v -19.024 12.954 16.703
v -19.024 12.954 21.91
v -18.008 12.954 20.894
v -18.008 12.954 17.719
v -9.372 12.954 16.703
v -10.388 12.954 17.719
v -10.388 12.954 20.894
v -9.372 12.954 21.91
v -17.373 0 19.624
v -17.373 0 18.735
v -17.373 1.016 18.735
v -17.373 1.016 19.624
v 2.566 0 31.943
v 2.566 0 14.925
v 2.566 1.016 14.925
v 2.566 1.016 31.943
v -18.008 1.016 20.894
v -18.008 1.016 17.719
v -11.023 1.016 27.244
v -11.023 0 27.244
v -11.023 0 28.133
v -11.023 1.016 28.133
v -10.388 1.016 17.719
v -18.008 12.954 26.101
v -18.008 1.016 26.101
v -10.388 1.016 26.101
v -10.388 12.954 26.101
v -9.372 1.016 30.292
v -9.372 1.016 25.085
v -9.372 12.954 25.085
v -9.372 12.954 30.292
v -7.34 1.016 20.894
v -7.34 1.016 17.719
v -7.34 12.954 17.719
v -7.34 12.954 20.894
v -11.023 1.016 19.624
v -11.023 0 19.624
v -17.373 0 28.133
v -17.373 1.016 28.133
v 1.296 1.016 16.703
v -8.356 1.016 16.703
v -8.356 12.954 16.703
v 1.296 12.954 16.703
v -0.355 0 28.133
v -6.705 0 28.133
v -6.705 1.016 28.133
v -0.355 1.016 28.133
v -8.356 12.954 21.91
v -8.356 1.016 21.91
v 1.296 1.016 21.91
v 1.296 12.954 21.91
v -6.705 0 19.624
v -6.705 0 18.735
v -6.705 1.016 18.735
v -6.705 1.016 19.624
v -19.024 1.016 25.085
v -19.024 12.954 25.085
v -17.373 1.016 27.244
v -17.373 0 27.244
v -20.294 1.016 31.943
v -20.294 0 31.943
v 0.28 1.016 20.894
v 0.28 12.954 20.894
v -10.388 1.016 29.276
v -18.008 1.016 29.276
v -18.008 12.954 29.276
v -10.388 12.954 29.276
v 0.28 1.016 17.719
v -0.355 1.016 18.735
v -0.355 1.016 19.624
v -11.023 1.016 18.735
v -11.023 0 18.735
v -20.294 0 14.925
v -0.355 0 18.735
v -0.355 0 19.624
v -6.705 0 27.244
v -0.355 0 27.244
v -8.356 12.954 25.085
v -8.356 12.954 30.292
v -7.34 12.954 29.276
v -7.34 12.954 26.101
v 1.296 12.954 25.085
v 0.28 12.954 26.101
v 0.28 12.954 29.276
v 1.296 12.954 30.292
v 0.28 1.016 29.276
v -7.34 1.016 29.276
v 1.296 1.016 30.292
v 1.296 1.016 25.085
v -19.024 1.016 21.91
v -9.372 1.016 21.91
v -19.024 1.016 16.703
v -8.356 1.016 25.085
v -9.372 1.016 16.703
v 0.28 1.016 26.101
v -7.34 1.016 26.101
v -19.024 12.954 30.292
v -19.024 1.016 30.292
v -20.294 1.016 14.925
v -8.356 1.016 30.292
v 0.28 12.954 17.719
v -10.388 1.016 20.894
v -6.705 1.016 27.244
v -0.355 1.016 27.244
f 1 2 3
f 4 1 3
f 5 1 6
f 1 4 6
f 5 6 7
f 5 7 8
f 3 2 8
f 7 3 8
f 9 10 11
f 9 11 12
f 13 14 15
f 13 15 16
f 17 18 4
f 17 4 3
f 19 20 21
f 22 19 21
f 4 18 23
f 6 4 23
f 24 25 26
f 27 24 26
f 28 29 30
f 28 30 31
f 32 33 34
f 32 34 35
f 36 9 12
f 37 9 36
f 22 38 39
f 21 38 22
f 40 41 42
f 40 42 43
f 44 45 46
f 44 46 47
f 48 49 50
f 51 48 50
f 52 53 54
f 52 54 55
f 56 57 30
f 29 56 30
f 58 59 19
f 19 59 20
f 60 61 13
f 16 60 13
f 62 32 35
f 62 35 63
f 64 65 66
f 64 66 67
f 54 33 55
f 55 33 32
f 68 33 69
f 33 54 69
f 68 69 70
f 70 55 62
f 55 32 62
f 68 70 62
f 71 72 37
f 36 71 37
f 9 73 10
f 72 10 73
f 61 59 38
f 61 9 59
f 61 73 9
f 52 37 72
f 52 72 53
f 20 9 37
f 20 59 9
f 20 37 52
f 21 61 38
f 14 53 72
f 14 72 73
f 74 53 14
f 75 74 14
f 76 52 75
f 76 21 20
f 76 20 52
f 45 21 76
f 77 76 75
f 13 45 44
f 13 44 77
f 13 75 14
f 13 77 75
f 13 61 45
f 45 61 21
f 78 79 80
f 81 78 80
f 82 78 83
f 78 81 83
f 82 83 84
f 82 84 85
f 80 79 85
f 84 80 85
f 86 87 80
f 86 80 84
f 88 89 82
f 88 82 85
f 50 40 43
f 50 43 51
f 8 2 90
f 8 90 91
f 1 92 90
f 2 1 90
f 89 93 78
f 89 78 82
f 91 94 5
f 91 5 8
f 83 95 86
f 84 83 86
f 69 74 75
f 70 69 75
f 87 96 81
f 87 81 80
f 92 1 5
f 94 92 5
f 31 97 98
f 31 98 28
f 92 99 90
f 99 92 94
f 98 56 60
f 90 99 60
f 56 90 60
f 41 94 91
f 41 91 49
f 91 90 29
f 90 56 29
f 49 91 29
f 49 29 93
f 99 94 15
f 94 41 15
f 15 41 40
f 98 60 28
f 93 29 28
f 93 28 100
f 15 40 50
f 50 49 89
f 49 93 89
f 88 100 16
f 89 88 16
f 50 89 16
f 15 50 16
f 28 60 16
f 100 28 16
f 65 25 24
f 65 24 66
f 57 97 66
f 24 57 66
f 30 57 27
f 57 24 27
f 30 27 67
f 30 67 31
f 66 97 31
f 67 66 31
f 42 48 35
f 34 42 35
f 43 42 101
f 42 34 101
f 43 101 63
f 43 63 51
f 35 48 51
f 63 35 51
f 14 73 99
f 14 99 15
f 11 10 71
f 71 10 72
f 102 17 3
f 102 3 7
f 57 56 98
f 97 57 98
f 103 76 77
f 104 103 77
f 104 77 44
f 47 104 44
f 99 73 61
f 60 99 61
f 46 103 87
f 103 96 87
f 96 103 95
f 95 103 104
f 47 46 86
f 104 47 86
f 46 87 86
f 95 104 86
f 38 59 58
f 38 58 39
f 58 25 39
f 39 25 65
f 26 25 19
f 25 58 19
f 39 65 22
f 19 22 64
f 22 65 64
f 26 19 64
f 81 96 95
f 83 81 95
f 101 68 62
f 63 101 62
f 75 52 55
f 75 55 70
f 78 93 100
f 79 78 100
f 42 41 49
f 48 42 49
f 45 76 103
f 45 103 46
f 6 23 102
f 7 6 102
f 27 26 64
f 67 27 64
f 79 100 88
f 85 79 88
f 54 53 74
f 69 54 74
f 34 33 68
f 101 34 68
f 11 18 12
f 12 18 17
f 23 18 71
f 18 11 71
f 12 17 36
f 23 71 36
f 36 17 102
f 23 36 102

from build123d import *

# Parameters (mm, degrees)
F0_W     = 25.4
F0_H     = 22.86
F1_DEPTH = 1.016
F2_W     = 6.35
F2_H     = 0.889
F3_DEPTH = 25.4
F4_W     = 9.652
F4_H     = 5.207
F4_W_2   = 7.62
F4_H_2   = 3.175
F5_DEPTH = 12.954
F6_W     = 25.4
F6_H     = 2.794
F6_H_2   = 3.048
F7_DEPTH = 12.955
F8_W     = 2.54
F8_H     = 17.018
F9_DEPTH = 25.4


with BuildPart() as f1:
    # F0 (on Front) → F1 (new body)
    with BuildSketch(Plane.XZ):
        with Locations((-10.134171, 23.561226)):
            Rectangle(F0_W, F0_H)
    extrude(amount=-F1_DEPTH)

    # F2 (on face) → F3 (cut)
    with BuildSketch(Plane.XZ):
        with Locations((-14.198171, 27.688726)):
            Rectangle(F2_W, F2_H)
        with Locations((-3.530171, 27.688726)):
            Rectangle(F2_W, F2_H)
        with Locations((-14.198171, 19.179726)):
            Rectangle(F2_W, F2_H)
        with Locations((-3.530171, 19.179726)):
            Rectangle(F2_W, F2_H)
    extrude(amount=-F3_DEPTH, mode=Mode.SUBTRACT)

    # F4 (on face) → F5 (join)
    with BuildSketch(Plane.XZ):
        with Locations((-14.198171, 27.688726)):
            Rectangle(F4_W, F4_H)
        with Locations((-14.198171, 27.688726)):
            Rectangle(F4_W_2, F4_H_2, mode=Mode.SUBTRACT)
        with Locations((-3.530171, 27.688726)):
            Rectangle(F4_W, F4_H)
        with Locations((-3.530171, 27.688726)):
            Rectangle(F4_W_2, F4_H_2, mode=Mode.SUBTRACT)
        with Locations((-14.198171, 19.306726)):
            Rectangle(F4_W, F4_H)
        with Locations((-14.198171, 19.306726)):
            Rectangle(F4_W_2, F4_H_2, mode=Mode.SUBTRACT)
        with Locations((-3.530171, 19.306726)):
            Rectangle(F4_W, F4_H)
        with Locations((-3.530171, 19.306726)):
            Rectangle(F4_W_2, F4_H_2, mode=Mode.SUBTRACT)
    extrude(amount=-F5_DEPTH)

    # F6 (on face) → F7 (cut, through all)
    with BuildSketch(Plane.XZ):
        with Locations((-10.134171, 13.528226)):
            Rectangle(F6_W, F6_H)
        with Locations((-10.134171, 33.467226)):
            Rectangle(F6_W, F6_H_2)
    extrude(amount=-F7_DEPTH, mode=Mode.SUBTRACT)

    # F8 (on face) → F9 (cut)
    with BuildSketch(Plane.XZ):
        with Locations((-21.564171, 23.434226)):
            Rectangle(F8_W, F8_H)
    extrude(amount=-F9_DEPTH, mode=Mode.SUBTRACT)


solid = f1.part
